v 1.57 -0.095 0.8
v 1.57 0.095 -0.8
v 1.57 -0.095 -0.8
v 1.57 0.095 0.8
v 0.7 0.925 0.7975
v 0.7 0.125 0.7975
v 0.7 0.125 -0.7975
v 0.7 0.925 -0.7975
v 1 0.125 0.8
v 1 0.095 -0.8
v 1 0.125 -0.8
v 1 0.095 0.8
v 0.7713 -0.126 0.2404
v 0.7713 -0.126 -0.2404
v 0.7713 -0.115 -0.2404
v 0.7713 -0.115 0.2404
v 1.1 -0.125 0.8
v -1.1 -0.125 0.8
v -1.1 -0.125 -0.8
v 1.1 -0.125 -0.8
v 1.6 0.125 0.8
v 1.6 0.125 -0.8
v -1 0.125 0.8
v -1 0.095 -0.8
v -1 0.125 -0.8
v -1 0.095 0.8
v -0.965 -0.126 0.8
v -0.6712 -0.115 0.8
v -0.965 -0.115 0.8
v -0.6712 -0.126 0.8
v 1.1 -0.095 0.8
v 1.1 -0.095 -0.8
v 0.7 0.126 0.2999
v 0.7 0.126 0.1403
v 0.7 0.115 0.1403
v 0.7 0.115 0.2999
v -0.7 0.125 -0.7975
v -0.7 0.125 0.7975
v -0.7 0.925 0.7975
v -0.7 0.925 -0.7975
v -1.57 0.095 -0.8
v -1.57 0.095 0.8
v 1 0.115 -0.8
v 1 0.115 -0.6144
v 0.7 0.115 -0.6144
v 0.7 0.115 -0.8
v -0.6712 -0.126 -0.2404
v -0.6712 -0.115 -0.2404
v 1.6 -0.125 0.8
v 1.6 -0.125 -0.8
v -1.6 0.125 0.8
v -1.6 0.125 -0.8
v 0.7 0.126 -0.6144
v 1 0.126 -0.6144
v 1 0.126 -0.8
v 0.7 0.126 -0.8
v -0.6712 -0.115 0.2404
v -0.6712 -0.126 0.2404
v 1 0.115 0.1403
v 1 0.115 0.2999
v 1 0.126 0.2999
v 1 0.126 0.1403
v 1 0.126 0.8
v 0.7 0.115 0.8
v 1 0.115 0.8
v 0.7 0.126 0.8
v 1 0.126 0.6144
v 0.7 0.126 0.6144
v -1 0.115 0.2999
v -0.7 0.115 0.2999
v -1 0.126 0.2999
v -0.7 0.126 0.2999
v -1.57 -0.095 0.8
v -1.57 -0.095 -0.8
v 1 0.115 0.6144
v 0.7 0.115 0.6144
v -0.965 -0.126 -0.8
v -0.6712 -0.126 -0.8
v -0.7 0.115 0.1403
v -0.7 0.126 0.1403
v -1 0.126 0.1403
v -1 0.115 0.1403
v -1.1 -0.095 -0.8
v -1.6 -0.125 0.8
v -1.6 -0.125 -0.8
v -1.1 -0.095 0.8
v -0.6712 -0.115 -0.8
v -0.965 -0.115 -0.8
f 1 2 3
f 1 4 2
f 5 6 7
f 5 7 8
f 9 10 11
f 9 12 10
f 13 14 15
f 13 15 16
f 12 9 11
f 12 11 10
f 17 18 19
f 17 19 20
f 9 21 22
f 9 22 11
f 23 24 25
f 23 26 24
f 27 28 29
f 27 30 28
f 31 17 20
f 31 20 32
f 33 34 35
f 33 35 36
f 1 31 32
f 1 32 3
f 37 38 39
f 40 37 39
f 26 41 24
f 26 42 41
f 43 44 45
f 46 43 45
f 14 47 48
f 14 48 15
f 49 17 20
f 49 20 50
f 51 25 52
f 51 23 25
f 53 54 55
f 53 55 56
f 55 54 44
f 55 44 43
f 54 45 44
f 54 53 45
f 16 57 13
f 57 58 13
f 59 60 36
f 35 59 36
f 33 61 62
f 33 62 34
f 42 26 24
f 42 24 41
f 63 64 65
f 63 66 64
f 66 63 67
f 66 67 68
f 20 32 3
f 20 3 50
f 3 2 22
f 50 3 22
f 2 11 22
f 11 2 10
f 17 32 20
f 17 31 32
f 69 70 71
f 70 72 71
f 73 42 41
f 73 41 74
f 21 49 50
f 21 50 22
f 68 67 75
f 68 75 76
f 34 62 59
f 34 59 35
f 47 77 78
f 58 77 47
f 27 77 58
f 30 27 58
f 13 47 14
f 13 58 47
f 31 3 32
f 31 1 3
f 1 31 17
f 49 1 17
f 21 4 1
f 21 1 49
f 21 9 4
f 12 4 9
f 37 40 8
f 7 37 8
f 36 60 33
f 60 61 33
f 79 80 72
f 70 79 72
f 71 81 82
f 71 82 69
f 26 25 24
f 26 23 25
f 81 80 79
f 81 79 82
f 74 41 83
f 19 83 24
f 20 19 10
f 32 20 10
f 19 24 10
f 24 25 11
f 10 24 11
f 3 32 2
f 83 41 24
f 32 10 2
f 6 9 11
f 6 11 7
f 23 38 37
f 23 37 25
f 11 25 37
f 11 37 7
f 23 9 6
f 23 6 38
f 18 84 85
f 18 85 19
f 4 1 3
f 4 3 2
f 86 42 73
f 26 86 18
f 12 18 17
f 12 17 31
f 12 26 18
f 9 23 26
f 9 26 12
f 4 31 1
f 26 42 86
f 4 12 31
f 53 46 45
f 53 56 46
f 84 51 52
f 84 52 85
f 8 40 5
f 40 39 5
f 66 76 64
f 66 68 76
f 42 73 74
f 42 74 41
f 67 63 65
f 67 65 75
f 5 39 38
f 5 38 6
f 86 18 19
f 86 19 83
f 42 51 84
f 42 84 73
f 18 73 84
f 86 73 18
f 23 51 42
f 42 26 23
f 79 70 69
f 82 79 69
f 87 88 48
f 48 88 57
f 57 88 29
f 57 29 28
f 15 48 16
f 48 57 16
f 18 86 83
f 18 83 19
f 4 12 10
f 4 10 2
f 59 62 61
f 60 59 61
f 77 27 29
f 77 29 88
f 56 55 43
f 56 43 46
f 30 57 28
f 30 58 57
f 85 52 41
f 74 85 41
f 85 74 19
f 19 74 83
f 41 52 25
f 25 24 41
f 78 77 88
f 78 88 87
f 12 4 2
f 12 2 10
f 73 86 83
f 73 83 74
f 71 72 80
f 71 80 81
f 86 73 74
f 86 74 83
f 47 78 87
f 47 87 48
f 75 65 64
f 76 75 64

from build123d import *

# Parameters (mm, degrees)
EXTRUDE1_DEPTH        = 0.8
SKETCH1_5_W           = 1.4
SKETCH1_5_H           = 0.8
EXTRUDE5_DEPTH        = 0.7975
SKETCH2_W             = 1.442499651
SKETCH2_H             = 0.480833216
EXTRUDE6_DEPTH        = 0.001
EXTRUDE6_DEPTH_BACK   = 0.01
EXTRUDE7_DEPTH        = 0.8
EXTRUDE7_2_DEPTH      = 0.8
SKETCH5_W             = 0.3
SKETCH5_H             = 0.159637188
EXTRUDE8_DEPTH        = 0.001
EXTRUDE8_DEPTH_BACK   = 0.01
EXTRUDE8_2_DEPTH      = 0.001
EXTRUDE8_2_DEPTH_BACK = 0.01
EXTRUDE9_DEPTH        = 0.001
EXTRUDE9_DEPTH_BACK   = 0.01
EXTRUDE9_2_DEPTH      = 0.001
EXTRUDE9_2_DEPTH_BACK = 0.01


with BuildPart() as part:
    # Sketch1 → Extrude1 (new body, symmetric)
    with BuildSketch(Plane.XY):
        Polygon((-0.7, 0.125), (-1, 0.125), (-1, 0.095), (-1.57, 0.095), (-1.57, -0.095), (-1.1, -0.095), (-1.1, -0.125), (1.1, -0.125), (1.1, -0.095), (1.57, -0.095), (1.57, 0.095), (1, 0.095), (1, 0.125), (0.7, 0.125), (0.075, 0.125), (-0.075, 0.125), align=None)
    extrude(amount=EXTRUDE1_DEPTH, both=True)

    # Sketch1_5 → Extrude5 (add, symmetric)
    with BuildSketch(Plane.XY):
        with Locations((0, 0.525)):
            Rectangle(SKETCH1_5_W, SKETCH1_5_H)
    extrude(amount=EXTRUDE5_DEPTH, both=True)


with BuildPart() as body_2:
    # Sketch2 → Extrude6 (new body, two sides)
    with BuildSketch(Plane.XZ.offset(0.125)) as extrude6_sk:
        Polygon((-0.671163032, 0.8), (-0.965005553, 0.8), (-0.965005553, -0.8), (-0.671163032, -0.8), (-0.671163032, -0.240416608), (-0.671163032, 0.240416608), align=None)
        with Locations((0.050086794, 0)):
            Rectangle(SKETCH2_W, SKETCH2_H)
    extrude(amount=EXTRUDE6_DEPTH)
    extrude(extrude6_sk.sketch, amount=-EXTRUDE6_DEPTH_BACK)


with BuildPart() as body_3:
    # Sketch1_6 → Extrude7 (new body, symmetric)
    with BuildSketch(Plane.XY):
        Polygon((-1, 0.125), (-1.6, 0.125), (-1.6, -0.125), (-1.1, -0.125), (-1.1, -0.095), (-1.57, -0.095), (-1.57, 0.095), (-1, 0.095), align=None)
    extrude(amount=EXTRUDE7_DEPTH, both=True)


with BuildPart() as body_4:
    # Sketch1_6 → Extrude7 2 (new body, symmetric)
    with BuildSketch(Plane.XY):
        Polygon((1.1, -0.095), (1.1, -0.125), (1.6, -0.125), (1.6, 0.125), (1, 0.125), (1, 0.095), (1.57, 0.095), (1.57, -0.095), align=None)
    extrude(amount=EXTRUDE7_2_DEPTH, both=True)


with BuildPart() as body_5:
    # Sketch5 → Extrude8 (new body, two sides)
    with BuildSketch(Plane(origin=(0, 0.125, 0), x_dir=(-1, 0, 0), z_dir=(0, 1, 0))) as extrude8_sk:
        with Locations((0.85, 0.22010582)):
            Rectangle(SKETCH5_W, SKETCH5_H)
    extrude(amount=EXTRUDE8_DEPTH)
    extrude(extrude8_sk.sketch, amount=-EXTRUDE8_DEPTH_BACK)


with BuildPart() as body_6:
    # Sketch5 → Extrude8 2 (new body, two sides)
    with BuildSketch(Plane(origin=(0, 0.125, 0), x_dir=(-1, 0, 0), z_dir=(0, 1, 0))) as extrude8_2_sk:
        with Locations((-0.85, 0.22010582)):
            Rectangle(SKETCH5_W, SKETCH5_H)
    extrude(amount=EXTRUDE8_2_DEPTH)
    extrude(extrude8_2_sk.sketch, amount=-EXTRUDE8_2_DEPTH_BACK)


with BuildPart() as body_7:
    # Sketch5_3 → Extrude9 (new body, two sides)
    with BuildSketch(Plane(origin=(0, 0.125, 0), x_dir=(-1, 0, 0), z_dir=(0, 1, 0))) as extrude9_sk:
        Polygon((-0.7, -0.6143613), (-1, -0.6143613), (-1, -0.8), (-0.7, -0.8), (-0.7, -0.7975), align=None)
    extrude(amount=EXTRUDE9_DEPTH)
    extrude(extrude9_sk.sketch, amount=-EXTRUDE9_DEPTH_BACK)


with BuildPart() as body_8:
    # Sketch5_3 → Extrude9 2 (new body, two sides)
    with BuildSketch(Plane(origin=(0, 0.125, 0), x_dir=(-1, 0, 0), z_dir=(0, 1, 0))) as extrude9_2_sk:
        Polygon((-0.7, 0.8), (-1, 0.8), (-1, 0.6143613), (-0.7, 0.6143613), (-0.7, 0.7975), align=None)
    extrude(amount=EXTRUDE9_2_DEPTH)
    extrude(extrude9_2_sk.sketch, amount=-EXTRUDE9_2_DEPTH_BACK)


solid = Compound([part.part, body_2.part, body_3.part, body_4.part, body_5.part, body_6.part, body_7.part, body_8.part])
